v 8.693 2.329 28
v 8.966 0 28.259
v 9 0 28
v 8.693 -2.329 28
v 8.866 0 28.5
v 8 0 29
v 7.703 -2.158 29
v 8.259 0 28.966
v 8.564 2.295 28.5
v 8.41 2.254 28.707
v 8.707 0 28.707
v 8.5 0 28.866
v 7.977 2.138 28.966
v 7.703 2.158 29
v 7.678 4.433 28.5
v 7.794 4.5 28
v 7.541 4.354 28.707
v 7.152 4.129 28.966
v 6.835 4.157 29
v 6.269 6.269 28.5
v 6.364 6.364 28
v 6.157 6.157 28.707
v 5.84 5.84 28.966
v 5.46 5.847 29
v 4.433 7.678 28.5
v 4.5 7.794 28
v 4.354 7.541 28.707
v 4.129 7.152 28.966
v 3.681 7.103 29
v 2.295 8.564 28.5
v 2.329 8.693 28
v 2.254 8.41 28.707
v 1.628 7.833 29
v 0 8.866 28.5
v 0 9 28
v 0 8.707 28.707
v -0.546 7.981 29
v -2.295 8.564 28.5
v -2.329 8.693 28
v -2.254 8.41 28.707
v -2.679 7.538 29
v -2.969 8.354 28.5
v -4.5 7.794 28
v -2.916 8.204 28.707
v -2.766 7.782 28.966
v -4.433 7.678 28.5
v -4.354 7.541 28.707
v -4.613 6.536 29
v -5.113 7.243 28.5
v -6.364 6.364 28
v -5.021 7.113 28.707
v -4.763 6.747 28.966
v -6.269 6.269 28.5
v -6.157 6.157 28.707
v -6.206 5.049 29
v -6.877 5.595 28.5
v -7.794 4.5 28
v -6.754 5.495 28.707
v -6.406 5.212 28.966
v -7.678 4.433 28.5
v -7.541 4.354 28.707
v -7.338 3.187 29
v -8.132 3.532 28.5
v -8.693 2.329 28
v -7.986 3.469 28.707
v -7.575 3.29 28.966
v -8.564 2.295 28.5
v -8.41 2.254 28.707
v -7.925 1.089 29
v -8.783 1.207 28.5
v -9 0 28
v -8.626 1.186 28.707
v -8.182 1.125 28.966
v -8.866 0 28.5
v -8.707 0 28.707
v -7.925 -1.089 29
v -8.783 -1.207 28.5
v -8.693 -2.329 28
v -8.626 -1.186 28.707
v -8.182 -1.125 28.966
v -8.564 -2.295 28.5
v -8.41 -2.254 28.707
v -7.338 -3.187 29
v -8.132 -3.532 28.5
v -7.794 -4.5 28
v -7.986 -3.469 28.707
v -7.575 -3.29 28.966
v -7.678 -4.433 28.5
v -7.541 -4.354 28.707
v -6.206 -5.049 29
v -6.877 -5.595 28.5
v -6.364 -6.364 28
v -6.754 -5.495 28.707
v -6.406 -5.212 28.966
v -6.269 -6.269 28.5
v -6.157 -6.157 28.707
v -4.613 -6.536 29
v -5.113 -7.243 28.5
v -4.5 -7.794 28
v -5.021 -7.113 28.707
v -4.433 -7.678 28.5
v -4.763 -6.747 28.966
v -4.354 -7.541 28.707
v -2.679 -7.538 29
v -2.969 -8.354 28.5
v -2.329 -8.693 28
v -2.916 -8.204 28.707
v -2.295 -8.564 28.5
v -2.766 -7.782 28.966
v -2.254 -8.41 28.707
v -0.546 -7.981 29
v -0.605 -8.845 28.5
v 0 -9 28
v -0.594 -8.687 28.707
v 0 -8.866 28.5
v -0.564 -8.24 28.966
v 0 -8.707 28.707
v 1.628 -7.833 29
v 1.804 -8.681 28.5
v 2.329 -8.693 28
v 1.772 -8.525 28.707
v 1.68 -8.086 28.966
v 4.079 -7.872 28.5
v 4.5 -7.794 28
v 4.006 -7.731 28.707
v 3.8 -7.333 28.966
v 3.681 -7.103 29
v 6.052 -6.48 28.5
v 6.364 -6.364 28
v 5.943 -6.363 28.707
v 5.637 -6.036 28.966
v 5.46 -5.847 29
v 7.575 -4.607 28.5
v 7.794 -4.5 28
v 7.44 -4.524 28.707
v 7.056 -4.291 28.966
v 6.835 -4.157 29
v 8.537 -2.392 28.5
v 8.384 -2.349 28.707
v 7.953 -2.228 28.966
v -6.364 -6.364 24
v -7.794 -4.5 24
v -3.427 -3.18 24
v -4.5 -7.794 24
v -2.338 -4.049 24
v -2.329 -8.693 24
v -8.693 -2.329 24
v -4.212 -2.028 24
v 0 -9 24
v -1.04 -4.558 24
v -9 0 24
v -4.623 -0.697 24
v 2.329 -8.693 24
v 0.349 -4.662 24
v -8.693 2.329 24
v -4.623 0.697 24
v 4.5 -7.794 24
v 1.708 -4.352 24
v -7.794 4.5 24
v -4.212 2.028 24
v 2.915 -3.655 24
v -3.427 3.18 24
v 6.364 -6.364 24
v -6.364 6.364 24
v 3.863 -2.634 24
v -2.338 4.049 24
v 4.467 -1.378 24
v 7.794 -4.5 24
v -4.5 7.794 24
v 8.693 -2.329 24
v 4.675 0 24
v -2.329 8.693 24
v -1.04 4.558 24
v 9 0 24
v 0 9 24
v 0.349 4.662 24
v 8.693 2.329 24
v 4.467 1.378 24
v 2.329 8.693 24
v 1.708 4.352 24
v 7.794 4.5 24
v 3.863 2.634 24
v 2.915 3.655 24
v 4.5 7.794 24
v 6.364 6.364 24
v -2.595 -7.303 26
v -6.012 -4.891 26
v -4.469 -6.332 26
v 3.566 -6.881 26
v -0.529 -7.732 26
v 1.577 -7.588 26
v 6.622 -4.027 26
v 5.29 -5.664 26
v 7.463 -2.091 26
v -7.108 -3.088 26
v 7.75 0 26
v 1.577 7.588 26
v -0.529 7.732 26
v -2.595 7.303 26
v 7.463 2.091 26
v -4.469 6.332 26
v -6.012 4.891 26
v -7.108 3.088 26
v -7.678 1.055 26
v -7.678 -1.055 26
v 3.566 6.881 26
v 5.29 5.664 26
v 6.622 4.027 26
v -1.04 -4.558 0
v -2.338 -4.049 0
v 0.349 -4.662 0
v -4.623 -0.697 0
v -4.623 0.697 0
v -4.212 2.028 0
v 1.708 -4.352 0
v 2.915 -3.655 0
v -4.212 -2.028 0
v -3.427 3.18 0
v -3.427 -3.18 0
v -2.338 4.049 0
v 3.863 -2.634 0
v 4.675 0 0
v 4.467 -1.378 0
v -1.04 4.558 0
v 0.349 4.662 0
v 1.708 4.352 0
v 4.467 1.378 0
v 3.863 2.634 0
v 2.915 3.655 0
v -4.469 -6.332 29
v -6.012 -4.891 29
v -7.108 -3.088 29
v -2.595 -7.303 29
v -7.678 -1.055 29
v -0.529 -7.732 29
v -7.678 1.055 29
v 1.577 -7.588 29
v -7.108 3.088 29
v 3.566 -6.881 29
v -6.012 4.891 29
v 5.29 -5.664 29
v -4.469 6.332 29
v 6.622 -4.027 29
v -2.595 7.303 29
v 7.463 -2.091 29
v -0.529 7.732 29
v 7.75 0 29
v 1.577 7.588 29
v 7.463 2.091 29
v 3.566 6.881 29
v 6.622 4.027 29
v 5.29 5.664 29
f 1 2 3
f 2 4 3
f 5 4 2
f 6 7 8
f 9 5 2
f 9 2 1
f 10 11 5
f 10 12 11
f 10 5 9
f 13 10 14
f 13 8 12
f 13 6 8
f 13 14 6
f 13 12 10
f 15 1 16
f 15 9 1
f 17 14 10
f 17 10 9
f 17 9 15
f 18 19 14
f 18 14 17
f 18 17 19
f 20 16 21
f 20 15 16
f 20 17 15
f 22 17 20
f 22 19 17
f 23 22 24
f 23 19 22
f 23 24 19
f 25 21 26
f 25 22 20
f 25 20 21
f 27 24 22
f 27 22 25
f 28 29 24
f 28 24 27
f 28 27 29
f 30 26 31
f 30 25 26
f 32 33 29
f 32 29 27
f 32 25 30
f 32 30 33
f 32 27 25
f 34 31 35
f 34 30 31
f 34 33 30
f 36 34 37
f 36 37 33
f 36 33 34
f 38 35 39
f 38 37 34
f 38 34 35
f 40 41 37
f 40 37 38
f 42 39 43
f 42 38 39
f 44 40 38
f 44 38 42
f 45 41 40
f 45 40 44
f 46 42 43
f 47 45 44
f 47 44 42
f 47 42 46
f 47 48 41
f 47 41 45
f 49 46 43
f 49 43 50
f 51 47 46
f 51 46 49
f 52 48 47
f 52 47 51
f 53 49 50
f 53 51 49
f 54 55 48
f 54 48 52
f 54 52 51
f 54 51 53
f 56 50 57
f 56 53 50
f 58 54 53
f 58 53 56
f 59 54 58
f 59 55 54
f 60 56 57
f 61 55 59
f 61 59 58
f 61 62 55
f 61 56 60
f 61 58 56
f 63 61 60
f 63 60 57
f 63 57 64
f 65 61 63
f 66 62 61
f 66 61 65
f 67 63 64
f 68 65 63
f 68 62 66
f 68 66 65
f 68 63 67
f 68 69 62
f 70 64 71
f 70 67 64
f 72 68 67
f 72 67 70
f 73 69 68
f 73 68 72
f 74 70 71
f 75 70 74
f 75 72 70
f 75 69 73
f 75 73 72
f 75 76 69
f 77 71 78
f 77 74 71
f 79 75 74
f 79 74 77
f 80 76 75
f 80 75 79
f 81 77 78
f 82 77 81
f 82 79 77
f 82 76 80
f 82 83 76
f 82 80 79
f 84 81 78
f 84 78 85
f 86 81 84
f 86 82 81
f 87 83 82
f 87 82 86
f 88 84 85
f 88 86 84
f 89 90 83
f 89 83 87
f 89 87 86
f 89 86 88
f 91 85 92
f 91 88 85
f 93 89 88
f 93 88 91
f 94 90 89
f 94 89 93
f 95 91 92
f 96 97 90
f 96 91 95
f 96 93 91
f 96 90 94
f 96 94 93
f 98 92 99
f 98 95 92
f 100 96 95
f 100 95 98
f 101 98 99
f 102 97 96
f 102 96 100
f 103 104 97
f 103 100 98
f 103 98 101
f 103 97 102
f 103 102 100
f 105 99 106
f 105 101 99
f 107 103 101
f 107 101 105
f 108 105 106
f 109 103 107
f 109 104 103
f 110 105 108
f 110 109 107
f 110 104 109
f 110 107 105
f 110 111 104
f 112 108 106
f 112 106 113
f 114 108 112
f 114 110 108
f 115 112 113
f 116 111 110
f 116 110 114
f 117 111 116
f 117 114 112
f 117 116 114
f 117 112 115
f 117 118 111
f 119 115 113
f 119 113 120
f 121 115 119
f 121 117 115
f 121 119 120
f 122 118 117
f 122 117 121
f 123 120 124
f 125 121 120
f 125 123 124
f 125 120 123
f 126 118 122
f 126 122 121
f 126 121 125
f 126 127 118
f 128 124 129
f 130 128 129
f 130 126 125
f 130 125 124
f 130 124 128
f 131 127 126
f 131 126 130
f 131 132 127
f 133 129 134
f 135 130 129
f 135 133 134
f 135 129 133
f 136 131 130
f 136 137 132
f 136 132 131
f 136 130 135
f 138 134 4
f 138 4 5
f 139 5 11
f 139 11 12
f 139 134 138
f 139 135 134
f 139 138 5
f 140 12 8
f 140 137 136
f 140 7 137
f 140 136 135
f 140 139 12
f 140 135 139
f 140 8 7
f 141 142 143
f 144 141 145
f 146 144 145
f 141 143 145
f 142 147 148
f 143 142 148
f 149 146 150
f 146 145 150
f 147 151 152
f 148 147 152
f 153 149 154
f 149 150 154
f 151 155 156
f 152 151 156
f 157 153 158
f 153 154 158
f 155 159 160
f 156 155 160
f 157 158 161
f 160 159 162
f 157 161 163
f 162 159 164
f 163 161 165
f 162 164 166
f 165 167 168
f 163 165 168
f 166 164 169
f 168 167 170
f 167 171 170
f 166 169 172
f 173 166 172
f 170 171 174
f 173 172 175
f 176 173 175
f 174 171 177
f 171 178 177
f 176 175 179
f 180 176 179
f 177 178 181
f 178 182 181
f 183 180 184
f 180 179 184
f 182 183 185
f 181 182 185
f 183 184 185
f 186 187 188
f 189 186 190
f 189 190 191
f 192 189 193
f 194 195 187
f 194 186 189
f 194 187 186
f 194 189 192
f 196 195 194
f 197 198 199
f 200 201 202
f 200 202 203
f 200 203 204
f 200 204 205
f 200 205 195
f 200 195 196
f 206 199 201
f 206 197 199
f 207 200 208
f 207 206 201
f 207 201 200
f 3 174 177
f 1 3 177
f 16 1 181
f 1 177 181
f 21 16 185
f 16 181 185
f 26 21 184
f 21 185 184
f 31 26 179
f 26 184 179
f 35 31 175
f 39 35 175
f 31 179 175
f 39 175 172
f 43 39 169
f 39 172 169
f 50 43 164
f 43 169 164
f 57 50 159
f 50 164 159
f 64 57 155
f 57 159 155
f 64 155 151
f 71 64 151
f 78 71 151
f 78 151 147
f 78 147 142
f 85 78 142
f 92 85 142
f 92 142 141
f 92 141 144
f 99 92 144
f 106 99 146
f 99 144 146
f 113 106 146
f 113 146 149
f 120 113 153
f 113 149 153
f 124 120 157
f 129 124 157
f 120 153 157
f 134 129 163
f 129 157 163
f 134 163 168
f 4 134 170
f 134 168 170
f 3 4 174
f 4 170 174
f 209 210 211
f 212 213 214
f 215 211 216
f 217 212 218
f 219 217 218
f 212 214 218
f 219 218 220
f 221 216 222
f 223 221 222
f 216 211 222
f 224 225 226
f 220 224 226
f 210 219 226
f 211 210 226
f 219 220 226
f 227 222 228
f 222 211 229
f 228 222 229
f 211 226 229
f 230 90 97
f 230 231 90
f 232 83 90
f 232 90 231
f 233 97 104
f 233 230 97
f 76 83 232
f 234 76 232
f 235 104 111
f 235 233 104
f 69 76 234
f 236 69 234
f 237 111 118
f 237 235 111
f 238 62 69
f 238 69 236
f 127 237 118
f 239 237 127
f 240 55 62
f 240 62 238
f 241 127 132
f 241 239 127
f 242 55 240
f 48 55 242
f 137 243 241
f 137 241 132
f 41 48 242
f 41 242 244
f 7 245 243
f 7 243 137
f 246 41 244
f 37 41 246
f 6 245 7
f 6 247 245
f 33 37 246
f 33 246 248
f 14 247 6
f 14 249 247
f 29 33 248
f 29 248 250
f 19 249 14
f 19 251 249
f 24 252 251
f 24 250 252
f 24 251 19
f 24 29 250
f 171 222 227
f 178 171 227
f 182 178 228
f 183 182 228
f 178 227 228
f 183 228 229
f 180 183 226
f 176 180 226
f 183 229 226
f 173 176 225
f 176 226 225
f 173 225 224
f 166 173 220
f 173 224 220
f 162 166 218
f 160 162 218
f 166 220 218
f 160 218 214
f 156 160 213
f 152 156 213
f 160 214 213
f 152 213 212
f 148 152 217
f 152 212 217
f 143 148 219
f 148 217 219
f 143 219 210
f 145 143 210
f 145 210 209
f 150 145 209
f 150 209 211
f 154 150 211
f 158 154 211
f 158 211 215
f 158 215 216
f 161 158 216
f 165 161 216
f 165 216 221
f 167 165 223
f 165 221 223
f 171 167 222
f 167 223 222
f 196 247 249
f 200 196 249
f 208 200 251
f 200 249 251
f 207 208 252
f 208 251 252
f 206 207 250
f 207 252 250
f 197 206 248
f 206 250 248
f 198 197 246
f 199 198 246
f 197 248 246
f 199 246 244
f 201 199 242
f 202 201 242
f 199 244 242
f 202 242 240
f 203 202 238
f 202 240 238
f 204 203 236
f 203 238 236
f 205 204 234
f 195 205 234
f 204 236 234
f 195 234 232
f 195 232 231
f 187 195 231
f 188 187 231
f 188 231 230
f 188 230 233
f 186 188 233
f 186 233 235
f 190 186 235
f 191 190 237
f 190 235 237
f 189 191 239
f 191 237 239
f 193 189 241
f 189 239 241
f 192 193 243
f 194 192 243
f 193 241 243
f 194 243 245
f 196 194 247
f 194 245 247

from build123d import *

# Parameters (mm, degrees)
F0_R     = 4.675
F1_DEPTH = 24
F2_R     = 9
F3_DEPTH = 5
F4_R     = 7.75
F5_DEPTH = 3
F6_R     = 1


with BuildPart() as f1:
    # F0 (on Top) → F1 (new body)
    with BuildSketch(Plane.XY):
        Circle(F0_R)
    extrude(amount=F1_DEPTH)

    # F2 (on face) → F3 (join)
    with BuildSketch(Plane.XY.offset(24)):
        Circle(F2_R)
    extrude(amount=F3_DEPTH)

    # F4 (on face) → F5 (cut)
    with BuildSketch(Plane.XY.offset(29)):
        Circle(F4_R)
    extrude(amount=-F5_DEPTH, mode=Mode.SUBTRACT)

    # F6
    f6_edges = [f1.edges().sort_by_distance(p)[0] for p in [
        (-9, 0, 29),
    ]]
    fillet(f6_edges, radius=F6_R)


solid = f1.part
